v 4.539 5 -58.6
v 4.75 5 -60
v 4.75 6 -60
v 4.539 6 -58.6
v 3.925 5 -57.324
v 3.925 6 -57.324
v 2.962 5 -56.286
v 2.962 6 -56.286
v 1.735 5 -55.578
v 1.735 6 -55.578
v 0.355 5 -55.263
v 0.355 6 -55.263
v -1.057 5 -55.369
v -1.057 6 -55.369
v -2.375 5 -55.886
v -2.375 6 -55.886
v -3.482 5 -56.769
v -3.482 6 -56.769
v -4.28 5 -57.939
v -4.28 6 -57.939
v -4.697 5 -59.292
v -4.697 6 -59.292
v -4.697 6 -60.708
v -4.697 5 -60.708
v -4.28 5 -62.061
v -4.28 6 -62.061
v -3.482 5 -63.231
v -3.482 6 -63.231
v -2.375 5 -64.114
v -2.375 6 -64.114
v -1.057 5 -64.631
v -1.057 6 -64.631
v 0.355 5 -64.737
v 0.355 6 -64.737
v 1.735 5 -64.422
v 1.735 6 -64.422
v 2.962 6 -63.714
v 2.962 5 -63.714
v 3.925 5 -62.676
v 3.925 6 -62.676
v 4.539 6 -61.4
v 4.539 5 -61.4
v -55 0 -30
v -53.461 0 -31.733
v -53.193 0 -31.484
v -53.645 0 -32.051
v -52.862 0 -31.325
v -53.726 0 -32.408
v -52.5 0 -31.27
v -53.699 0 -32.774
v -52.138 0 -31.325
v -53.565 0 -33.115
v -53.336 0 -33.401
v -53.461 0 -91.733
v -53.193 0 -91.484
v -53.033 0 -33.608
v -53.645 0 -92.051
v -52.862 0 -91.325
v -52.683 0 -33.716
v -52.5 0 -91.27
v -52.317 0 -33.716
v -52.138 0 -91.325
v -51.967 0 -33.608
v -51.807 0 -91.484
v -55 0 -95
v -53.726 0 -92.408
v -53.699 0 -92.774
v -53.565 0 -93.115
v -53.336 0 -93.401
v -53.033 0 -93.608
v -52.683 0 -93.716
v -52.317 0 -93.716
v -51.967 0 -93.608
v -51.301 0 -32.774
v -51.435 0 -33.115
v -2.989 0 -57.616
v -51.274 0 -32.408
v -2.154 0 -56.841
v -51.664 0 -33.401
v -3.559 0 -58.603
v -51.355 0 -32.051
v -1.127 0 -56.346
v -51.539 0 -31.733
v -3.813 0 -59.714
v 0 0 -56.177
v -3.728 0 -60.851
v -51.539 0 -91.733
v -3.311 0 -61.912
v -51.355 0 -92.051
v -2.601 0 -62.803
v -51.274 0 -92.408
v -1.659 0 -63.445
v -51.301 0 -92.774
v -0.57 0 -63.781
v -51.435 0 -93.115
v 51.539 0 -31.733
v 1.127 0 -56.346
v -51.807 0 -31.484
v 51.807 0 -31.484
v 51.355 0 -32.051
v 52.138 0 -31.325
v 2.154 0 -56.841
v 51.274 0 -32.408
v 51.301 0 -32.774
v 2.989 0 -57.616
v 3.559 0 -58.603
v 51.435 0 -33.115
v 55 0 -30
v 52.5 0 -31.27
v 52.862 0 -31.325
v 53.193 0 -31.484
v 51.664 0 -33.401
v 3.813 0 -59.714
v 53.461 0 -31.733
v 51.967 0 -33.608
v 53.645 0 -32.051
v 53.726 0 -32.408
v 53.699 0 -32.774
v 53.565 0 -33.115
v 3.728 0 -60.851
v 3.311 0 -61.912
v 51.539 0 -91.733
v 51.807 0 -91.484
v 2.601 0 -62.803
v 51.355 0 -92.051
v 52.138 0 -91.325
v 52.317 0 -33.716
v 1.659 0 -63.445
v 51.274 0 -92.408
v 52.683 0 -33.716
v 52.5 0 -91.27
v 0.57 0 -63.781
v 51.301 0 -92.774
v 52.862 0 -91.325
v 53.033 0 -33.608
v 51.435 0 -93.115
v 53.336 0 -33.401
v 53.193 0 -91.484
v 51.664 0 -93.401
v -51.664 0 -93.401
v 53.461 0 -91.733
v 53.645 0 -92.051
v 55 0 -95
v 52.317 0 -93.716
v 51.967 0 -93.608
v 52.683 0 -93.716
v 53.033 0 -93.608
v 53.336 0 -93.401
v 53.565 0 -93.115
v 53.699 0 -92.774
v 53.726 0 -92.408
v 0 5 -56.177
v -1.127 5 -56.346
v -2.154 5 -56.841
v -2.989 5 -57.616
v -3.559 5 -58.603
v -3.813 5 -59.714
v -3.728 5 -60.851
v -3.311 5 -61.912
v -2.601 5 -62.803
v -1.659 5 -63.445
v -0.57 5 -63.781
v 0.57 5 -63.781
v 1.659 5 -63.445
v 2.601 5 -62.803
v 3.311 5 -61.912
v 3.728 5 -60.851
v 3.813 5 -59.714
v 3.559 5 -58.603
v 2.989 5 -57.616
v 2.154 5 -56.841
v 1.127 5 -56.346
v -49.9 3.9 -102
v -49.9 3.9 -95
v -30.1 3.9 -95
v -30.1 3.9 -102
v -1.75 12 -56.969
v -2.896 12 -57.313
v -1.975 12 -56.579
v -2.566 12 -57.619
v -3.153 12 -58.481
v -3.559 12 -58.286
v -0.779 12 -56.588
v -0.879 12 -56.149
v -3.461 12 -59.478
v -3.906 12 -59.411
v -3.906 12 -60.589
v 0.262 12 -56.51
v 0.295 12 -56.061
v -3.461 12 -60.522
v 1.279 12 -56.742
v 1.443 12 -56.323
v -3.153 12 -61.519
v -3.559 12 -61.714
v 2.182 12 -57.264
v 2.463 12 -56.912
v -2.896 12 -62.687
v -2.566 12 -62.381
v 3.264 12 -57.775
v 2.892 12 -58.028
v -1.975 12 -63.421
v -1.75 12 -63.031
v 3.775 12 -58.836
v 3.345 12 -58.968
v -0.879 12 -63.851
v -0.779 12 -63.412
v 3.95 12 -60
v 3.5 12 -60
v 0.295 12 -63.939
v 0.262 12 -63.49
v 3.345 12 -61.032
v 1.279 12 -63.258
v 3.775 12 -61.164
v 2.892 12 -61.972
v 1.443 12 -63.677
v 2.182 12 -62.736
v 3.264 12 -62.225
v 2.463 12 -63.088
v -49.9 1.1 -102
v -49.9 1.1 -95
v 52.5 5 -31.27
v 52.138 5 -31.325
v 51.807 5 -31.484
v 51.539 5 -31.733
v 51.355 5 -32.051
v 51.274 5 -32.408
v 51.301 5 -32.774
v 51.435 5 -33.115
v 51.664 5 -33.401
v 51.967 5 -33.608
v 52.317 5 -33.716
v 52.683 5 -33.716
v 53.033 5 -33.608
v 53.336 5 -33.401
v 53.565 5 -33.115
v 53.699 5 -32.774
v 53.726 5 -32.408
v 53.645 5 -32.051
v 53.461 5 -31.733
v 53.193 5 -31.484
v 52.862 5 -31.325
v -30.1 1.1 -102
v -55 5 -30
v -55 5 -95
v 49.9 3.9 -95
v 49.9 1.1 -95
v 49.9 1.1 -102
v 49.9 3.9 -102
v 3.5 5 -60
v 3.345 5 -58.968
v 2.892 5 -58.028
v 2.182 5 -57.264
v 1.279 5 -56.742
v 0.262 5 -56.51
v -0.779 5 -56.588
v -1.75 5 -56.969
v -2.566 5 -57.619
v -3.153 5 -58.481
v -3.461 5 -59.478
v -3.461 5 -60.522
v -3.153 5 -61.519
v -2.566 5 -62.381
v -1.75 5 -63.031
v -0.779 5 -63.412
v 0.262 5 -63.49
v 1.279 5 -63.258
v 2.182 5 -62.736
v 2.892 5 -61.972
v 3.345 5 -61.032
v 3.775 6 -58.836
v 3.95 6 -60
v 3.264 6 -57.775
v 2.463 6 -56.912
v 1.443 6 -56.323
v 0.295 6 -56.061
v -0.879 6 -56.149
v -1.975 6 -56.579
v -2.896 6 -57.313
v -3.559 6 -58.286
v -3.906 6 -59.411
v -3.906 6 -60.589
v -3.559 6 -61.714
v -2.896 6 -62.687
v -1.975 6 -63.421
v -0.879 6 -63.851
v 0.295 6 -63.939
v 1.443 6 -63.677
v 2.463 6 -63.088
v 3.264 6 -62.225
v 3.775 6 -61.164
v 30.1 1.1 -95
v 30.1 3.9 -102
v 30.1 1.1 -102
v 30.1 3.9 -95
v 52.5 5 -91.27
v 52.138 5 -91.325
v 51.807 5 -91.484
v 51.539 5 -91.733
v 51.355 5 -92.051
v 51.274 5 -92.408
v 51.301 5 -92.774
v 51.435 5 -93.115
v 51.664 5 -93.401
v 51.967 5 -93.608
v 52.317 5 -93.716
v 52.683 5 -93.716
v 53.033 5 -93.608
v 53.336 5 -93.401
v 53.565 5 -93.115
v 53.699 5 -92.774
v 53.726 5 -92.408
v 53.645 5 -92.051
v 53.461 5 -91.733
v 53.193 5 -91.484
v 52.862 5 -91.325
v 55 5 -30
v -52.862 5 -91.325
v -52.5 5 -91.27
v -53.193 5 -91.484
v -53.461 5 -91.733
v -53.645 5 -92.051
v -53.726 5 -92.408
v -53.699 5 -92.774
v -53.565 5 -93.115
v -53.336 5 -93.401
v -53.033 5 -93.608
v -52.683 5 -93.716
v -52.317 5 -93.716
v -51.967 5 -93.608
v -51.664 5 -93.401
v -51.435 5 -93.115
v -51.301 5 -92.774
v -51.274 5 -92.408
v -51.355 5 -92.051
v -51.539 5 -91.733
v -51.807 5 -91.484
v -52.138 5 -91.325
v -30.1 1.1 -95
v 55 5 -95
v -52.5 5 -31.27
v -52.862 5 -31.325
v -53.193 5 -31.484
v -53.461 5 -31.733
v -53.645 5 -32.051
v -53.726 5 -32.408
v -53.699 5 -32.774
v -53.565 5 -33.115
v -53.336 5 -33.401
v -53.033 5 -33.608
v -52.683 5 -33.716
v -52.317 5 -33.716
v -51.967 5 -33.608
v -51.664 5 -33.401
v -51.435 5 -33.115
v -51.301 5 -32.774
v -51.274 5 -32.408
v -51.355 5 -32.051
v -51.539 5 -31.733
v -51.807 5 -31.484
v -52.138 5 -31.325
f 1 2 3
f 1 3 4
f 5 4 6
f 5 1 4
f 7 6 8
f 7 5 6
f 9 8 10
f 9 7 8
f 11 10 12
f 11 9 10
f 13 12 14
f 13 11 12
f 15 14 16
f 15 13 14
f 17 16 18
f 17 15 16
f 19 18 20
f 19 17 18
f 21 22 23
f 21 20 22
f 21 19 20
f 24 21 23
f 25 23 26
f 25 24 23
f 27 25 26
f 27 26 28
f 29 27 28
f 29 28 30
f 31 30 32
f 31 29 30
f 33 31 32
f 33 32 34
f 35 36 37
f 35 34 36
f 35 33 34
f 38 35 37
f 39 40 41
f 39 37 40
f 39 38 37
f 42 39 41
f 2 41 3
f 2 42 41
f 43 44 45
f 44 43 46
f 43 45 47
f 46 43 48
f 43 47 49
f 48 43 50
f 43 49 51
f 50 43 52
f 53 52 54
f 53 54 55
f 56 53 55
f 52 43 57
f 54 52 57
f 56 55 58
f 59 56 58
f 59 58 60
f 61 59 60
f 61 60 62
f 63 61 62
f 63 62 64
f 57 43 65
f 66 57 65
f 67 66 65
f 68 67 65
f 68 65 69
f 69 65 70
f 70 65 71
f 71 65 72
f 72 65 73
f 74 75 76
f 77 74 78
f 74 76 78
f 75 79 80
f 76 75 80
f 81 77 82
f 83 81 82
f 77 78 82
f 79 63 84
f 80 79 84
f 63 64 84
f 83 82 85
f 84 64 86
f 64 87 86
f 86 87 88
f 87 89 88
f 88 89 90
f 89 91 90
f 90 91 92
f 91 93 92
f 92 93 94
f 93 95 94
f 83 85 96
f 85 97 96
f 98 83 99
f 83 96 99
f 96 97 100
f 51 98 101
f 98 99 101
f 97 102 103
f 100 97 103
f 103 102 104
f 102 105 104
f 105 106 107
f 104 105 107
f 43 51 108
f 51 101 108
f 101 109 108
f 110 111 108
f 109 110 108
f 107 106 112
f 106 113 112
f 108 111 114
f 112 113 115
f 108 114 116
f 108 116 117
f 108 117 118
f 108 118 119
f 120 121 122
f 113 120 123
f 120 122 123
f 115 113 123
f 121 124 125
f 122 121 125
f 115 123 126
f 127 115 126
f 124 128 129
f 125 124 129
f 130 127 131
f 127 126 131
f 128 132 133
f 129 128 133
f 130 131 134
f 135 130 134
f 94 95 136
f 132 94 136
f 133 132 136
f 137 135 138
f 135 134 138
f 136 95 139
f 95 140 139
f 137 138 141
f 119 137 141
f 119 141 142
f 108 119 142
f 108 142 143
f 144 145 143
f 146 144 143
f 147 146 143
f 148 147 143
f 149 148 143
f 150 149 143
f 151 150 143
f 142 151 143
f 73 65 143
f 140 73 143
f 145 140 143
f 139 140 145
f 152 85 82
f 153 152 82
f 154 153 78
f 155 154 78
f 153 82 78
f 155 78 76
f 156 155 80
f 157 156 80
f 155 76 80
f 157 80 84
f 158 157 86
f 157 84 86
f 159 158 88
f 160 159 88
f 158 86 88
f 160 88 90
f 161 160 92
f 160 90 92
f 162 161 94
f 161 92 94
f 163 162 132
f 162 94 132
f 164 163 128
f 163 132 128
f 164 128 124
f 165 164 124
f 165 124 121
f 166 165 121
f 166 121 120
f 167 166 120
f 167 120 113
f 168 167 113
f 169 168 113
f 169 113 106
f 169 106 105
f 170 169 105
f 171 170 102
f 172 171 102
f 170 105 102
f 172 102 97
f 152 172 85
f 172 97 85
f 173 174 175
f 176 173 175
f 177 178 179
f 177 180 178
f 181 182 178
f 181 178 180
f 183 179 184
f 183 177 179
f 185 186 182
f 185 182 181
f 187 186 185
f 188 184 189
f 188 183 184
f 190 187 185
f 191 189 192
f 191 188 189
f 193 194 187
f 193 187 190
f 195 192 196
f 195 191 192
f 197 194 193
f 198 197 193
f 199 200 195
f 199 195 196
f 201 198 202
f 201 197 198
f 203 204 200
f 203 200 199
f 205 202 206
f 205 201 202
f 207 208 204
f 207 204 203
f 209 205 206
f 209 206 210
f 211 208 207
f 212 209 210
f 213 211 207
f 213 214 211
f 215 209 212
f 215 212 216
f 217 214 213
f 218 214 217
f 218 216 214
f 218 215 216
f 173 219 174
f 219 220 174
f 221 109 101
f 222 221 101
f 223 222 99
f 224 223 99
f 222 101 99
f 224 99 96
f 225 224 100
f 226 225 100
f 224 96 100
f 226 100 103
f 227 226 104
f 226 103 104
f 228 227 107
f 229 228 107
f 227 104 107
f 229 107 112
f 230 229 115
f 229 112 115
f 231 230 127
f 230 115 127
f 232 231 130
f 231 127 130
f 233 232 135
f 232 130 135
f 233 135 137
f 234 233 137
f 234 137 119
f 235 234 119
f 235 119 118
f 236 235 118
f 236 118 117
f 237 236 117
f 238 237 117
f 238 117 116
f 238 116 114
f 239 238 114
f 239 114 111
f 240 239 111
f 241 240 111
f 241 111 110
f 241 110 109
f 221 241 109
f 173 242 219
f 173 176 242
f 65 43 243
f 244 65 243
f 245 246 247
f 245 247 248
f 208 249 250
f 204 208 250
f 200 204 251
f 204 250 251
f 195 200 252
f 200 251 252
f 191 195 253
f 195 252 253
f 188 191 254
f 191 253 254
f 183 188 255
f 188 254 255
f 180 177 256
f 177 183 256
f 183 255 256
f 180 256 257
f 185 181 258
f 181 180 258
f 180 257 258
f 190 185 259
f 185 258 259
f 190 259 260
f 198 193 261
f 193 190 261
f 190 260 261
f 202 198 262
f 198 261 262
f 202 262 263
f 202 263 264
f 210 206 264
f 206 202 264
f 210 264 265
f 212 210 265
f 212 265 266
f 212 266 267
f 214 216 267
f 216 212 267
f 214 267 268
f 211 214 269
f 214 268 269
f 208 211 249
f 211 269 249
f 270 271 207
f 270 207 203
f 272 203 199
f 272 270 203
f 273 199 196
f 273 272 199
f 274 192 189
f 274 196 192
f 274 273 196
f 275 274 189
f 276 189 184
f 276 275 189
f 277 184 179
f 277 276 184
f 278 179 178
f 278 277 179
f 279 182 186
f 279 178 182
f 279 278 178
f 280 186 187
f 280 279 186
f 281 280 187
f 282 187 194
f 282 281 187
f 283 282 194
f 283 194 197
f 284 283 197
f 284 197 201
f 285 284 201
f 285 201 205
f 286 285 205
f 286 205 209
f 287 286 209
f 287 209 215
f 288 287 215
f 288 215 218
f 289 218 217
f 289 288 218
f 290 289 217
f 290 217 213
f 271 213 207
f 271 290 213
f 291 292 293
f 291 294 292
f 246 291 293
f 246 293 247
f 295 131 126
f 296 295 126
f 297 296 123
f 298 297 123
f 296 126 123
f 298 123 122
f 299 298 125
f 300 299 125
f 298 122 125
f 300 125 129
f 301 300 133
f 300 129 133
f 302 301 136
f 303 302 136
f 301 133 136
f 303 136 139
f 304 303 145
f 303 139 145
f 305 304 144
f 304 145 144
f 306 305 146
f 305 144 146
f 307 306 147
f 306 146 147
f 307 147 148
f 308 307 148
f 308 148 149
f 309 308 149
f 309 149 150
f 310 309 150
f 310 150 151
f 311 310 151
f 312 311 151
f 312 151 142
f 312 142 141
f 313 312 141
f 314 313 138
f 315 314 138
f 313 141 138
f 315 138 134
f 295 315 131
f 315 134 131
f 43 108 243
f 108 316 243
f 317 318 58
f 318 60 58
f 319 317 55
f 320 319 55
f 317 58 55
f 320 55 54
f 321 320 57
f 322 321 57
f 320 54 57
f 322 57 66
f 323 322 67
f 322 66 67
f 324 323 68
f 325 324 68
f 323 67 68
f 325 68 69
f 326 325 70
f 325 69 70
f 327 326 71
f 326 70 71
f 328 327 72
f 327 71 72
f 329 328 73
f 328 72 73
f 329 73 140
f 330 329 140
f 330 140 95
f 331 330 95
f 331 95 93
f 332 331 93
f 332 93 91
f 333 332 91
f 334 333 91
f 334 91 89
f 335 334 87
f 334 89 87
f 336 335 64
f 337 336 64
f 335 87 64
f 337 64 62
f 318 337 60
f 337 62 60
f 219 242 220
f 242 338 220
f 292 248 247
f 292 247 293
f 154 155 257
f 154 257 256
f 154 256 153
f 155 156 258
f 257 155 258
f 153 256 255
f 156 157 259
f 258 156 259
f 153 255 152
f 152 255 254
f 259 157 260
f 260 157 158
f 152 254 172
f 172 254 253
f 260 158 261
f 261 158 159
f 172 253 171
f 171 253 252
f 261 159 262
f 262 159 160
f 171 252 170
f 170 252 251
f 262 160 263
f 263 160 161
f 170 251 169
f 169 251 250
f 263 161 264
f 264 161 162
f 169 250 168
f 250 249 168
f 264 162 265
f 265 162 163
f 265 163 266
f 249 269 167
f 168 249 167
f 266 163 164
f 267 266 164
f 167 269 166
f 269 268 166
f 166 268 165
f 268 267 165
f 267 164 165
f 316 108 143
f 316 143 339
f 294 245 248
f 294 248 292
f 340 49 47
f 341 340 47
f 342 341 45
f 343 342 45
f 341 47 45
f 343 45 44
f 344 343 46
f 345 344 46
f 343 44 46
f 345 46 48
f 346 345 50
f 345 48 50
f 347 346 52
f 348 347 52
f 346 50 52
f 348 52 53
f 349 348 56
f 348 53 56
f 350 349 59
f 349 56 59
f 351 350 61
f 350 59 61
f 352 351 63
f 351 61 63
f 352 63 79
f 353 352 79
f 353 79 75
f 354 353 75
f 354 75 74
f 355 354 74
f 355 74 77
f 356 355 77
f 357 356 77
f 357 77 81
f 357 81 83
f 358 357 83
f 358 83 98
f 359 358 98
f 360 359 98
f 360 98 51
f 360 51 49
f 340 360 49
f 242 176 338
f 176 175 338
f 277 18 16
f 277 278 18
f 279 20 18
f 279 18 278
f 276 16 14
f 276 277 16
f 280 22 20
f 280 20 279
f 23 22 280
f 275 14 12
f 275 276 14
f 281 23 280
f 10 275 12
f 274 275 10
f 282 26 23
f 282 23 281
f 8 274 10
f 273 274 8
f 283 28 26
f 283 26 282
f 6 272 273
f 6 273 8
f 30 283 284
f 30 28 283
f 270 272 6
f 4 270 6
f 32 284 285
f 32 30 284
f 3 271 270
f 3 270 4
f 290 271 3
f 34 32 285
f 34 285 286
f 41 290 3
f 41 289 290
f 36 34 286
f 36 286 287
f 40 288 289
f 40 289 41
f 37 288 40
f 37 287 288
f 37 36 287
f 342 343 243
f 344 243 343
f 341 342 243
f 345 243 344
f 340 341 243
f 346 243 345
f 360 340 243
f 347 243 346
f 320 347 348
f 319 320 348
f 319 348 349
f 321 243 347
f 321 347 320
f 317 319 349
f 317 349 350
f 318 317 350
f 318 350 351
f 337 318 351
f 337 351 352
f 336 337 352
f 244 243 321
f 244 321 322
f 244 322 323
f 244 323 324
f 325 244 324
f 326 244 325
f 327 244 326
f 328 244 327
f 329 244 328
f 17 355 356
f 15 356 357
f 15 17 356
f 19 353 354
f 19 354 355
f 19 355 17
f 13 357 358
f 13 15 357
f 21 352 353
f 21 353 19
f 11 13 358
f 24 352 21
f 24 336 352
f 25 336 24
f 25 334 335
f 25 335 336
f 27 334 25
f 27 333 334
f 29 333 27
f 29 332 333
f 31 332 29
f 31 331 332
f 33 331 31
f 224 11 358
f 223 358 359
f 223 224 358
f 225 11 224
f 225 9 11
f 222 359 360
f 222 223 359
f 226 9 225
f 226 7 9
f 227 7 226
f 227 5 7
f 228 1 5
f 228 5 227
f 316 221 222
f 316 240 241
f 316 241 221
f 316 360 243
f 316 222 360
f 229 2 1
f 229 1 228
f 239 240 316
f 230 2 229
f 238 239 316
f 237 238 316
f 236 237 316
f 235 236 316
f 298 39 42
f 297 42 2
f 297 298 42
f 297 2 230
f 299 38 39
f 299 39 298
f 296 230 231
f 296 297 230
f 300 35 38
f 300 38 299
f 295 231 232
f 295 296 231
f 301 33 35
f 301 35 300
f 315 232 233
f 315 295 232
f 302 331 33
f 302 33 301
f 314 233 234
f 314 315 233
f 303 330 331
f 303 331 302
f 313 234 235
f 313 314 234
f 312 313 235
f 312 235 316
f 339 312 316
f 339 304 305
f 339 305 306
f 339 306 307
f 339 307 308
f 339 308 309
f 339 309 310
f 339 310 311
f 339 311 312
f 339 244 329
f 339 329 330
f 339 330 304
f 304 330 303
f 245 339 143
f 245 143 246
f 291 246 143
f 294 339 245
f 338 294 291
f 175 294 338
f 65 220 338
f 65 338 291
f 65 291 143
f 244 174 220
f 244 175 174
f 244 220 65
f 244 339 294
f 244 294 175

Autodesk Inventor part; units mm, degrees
ref_plane "YZ Plane" through (0, 0, 0) normal (1, 0, 0) x (0, 1, 0)
ref_plane "XZ Plane" through (0, 0, 0) normal (0, 1, 0) x (-1, 0, 0)
ref_plane "XY Plane" through (0, 0, 0) normal (0, 0, 1) x (1, 0, 0)
sketch "Esquisse1" plane through (0, 0, 0) normal (0, 1, 0) x (-1, 0, 0)
  line L0 (-55, 100) -> (55, 100)
  line L1 (55, 100) -> (55, -100)
  line L2 (55, -100) -> (-55, -100)
  line L3 (-55, -100) -> (-55, 100)
  line L4 (-55, 100) -> (55, -100) construction
  line L5 (55, 100) -> (-55, -100) construction
  point P0 (0, 0)
  dimension "d0" = 110
  dimension "d1" = 200
extrude "Extrusion1" add sketch "Esquisse1" along normal blind 5
sketch "Esquisse4" plane through (0, 5, 0) normal (0, 1, 0) x (1, 0, 0)
  line L0 (0, 0) -> (0, 60)
  dimension "d22" = 60
hole "Perçage3" at (0, 5, -60) direction (0, -1, 0) diameter 7.6468 end through all thread size "M9x1.25" class "6H" standard "ISO Metric profile"
sketch "Esquisse5" plane through (0, 5, 0) normal (0, 1, 0) x (1, 0, 0)
  line L0 (-55, -100) -> (55, -100) projected
  line L1 (0, -100) -> (-27.5, -100)
  line L2 (-27.5, -100) -> (-27.5, -70)
  line L3 (-27.5, -70) -> (-37.5, -70)
  line L4 (-27.5, -70) -> (-7.5, -70)
  line L5 (-37.5, -70) -> (-37.5, -55)
  line L6 (-7.5, -55) -> (-7.5, -70)
  point P0 (0, 0)
  dimension "d30" = 27.5
  dimension "d31" = 30
  dimension "d32" = 10
  dimension "d33" = 20
  dimension "d34" = 15
hole "Perçage4" at (-7.5, 5, 70) at (-37.5, 5, 70) at (-37.5, 5, 55) at (-7.5, 5, 55) direction (0, -1, 0) diameter 2.459 end through all thread size "M3x0.5" class "6H" standard "ISO Metric profile"
sketch "Esquisse6" plane through (-55, 0, 100) normal (0, 0, 1) x (1, 0, 0)
  line L0 (0, 0) -> (110, 0) projected
  line L1 (110, 0) -> (110, 5) projected
  line L2 (0, 5) -> (110, 5) projected
  line L3 (0, 0) -> (0, 5) projected
  point P0 (55, 0)
extrude "Extrusion2" add sketch "Esquisse6" along normal blind 40
sketch "Esquisse7" plane through (0, 5, 0) normal (0, 1, 0) x (1, 0, 0)
  circle A0 centre (0, 60) radius 3.8234 projected
  circle A1 centre (0, 60) radius 3.5
  circle A2 centre (0, 60) radius 4.75
  point P0 (0, 0)
  dimension "d47" = 7
  dimension "d48" = 9.5
extrude "Extrusion3" add sketch "Esquisse7" along normal blind 1 contours A0 | A2
sketch "Esquisse8" plane through (0, 5, 0) normal (0, 1, 0) x (1, 0, 0)
  line L0 (-55, 100) -> (-55, -140) projected
  line L1 (55, 100) -> (55, -140) projected
  line L2 (-55, -140) -> (55, -140)
  line L3 (55, -140) -> (55, 30)
  line L4 (55, 30) -> (-55, 30)
  line L5 (-55, 30) -> (-55, -140)
  point P0 (0, 0)
  dimension "d51" = 170
extrude "Extrusion4" cut sketch "Esquisse8" against normal blind 10
sketch "Esquisse9" plane through (0, 5, 0) normal (0, 1, 0) x (1, 0, 0)
  line L0 (-55, 30) -> (55, 30) projected
  line L1 (-55, 30) -> (-55, 32.5)
  line L2 (-55, 100) -> (-55, 30) projected
  line L3 (-55, 32.5) -> (-52.5, 32.5)
  line L4 (55, 30) -> (55, 32.5)
  line L5 (55, 100) -> (55, 30) projected
  line L6 (55, 32.5) -> (52.5, 32.5)
  point P0 (0, 0)
  dimension "d54" = 2.5
  dimension "d55" = 2.5
  dimension "d56" = 2.5
  dimension "d57" = 2.5
hole "Perçage5" at (-52.5, 5, -32.5) at (52.5, 5, -32.5) direction (0, -1, 0) diameter 2.459 end through all thread size "M3x0.5" class "6H" standard "ISO Metric profile"
sketch "Esquisse10" plane through (0, 5, 0) normal (0, 1, 0) x (1, 0, 0)
  line L0 (55, 100) -> (-55, 100) projected
  line L1 (55, 100) -> (55, 30) projected
  line L2 (-55, 100) -> (55, 100)
  line L3 (55, 100) -> (55, 95)
  line L4 (55, 95) -> (-55, 95)
  line L5 (-55, 95) -> (-55, 100)
  point P0 (0, 0)
  dimension "d65" = 5
extrude "Extrusion5" cut sketch "Esquisse10" against normal blind 10
sketch "Esquisse11" plane through (0, 5, 0) normal (0, 1, 0) x (1, 0, 0)
  line L0 (-55, 95) -> (-52.5, 95)
  line L1 (55, 95) -> (-55, 95) projected
  line L2 (-52.5, 95) -> (-52.5, 92.5)
  line L3 (55, 95) -> (55, 30) projected
  line L4 (55, 95) -> (52.5, 95)
  line L5 (52.5, 95) -> (52.5, 92.5)
  point P0 (0, 0)
  dimension "d68" = 2.5
  dimension "d69" = 2.5
  dimension "d70" = 2.5
hole "Perçage6" at (-52.5, 5, -92.5) at (52.5, 5, -92.5) direction (0, -1, 0) diameter 2.459 end through all thread size "M3x0.5" class "6H" standard "ISO Metric profile"
sketch "Esquisse12" plane through (55, 5, -95) normal (0, 0, -1) x (-1, 0, 0)
  line L0 (0, -5) -> (0, 0) projected
  line L1 (0, 0) -> (5.1, 0)
  line L2 (110, 0) -> (0, 0) projected
  line L3 (5.1, 0) -> (5.1, -1.1)
  line L4 (5.1, -1.1) -> (24.9, -1.1)
  line L5 (24.9, -1.1) -> (24.9, -3.9)
  line L6 (24.9, -3.9) -> (5.1, -3.9)
  line L7 (5.1, -3.9) -> (5.1, -1.1)
  line L8 (110, -5) -> (110, 0) projected
  line L9 (110, 0) -> (104.9, 0)
  line L10 (104.9, 0) -> (104.9, -1.1)
  line L11 (104.9, -1.1) -> (85.1, -1.1)
  line L12 (85.1, -1.1) -> (85.1, -3.9)
  line L13 (85.1, -3.9) -> (104.9, -3.9)
  line L14 (104.9, -3.9) -> (104.9, -1.1)
  line L15 (110, -5) -> (0, -5) projected
  point P0 (55, -5)
  dimension "d78" = 5.1
  dimension "d79" = 1.1
  dimension "d80" = 19.8
  dimension "d81" = 2.8
  dimension "d82" = 5.1
  dimension "d83" = 19.8
  dimension "d86" = 1.1
  dimension "d87" = 1.1
extrude "Extrusion6" add sketch "Esquisse12" along normal blind 7 contours L14 L13 L12 L11 | L4 L5 L6 L7
sketch "Esquisse13" plane through (0, 6, -60) normal (0, 1, 0) x (1, 0, 0)
  circle A0 centre (0, 0) radius 3.95
  circle A1 centre (0, 0) radius 3.5
  point P0 (0, -60)
  dimension "d88" = 7.9
  dimension "d89" = 7
extrude "Extrusion7" add sketch "Esquisse13" along normal blind 6
properties part number "chassis_haut"
